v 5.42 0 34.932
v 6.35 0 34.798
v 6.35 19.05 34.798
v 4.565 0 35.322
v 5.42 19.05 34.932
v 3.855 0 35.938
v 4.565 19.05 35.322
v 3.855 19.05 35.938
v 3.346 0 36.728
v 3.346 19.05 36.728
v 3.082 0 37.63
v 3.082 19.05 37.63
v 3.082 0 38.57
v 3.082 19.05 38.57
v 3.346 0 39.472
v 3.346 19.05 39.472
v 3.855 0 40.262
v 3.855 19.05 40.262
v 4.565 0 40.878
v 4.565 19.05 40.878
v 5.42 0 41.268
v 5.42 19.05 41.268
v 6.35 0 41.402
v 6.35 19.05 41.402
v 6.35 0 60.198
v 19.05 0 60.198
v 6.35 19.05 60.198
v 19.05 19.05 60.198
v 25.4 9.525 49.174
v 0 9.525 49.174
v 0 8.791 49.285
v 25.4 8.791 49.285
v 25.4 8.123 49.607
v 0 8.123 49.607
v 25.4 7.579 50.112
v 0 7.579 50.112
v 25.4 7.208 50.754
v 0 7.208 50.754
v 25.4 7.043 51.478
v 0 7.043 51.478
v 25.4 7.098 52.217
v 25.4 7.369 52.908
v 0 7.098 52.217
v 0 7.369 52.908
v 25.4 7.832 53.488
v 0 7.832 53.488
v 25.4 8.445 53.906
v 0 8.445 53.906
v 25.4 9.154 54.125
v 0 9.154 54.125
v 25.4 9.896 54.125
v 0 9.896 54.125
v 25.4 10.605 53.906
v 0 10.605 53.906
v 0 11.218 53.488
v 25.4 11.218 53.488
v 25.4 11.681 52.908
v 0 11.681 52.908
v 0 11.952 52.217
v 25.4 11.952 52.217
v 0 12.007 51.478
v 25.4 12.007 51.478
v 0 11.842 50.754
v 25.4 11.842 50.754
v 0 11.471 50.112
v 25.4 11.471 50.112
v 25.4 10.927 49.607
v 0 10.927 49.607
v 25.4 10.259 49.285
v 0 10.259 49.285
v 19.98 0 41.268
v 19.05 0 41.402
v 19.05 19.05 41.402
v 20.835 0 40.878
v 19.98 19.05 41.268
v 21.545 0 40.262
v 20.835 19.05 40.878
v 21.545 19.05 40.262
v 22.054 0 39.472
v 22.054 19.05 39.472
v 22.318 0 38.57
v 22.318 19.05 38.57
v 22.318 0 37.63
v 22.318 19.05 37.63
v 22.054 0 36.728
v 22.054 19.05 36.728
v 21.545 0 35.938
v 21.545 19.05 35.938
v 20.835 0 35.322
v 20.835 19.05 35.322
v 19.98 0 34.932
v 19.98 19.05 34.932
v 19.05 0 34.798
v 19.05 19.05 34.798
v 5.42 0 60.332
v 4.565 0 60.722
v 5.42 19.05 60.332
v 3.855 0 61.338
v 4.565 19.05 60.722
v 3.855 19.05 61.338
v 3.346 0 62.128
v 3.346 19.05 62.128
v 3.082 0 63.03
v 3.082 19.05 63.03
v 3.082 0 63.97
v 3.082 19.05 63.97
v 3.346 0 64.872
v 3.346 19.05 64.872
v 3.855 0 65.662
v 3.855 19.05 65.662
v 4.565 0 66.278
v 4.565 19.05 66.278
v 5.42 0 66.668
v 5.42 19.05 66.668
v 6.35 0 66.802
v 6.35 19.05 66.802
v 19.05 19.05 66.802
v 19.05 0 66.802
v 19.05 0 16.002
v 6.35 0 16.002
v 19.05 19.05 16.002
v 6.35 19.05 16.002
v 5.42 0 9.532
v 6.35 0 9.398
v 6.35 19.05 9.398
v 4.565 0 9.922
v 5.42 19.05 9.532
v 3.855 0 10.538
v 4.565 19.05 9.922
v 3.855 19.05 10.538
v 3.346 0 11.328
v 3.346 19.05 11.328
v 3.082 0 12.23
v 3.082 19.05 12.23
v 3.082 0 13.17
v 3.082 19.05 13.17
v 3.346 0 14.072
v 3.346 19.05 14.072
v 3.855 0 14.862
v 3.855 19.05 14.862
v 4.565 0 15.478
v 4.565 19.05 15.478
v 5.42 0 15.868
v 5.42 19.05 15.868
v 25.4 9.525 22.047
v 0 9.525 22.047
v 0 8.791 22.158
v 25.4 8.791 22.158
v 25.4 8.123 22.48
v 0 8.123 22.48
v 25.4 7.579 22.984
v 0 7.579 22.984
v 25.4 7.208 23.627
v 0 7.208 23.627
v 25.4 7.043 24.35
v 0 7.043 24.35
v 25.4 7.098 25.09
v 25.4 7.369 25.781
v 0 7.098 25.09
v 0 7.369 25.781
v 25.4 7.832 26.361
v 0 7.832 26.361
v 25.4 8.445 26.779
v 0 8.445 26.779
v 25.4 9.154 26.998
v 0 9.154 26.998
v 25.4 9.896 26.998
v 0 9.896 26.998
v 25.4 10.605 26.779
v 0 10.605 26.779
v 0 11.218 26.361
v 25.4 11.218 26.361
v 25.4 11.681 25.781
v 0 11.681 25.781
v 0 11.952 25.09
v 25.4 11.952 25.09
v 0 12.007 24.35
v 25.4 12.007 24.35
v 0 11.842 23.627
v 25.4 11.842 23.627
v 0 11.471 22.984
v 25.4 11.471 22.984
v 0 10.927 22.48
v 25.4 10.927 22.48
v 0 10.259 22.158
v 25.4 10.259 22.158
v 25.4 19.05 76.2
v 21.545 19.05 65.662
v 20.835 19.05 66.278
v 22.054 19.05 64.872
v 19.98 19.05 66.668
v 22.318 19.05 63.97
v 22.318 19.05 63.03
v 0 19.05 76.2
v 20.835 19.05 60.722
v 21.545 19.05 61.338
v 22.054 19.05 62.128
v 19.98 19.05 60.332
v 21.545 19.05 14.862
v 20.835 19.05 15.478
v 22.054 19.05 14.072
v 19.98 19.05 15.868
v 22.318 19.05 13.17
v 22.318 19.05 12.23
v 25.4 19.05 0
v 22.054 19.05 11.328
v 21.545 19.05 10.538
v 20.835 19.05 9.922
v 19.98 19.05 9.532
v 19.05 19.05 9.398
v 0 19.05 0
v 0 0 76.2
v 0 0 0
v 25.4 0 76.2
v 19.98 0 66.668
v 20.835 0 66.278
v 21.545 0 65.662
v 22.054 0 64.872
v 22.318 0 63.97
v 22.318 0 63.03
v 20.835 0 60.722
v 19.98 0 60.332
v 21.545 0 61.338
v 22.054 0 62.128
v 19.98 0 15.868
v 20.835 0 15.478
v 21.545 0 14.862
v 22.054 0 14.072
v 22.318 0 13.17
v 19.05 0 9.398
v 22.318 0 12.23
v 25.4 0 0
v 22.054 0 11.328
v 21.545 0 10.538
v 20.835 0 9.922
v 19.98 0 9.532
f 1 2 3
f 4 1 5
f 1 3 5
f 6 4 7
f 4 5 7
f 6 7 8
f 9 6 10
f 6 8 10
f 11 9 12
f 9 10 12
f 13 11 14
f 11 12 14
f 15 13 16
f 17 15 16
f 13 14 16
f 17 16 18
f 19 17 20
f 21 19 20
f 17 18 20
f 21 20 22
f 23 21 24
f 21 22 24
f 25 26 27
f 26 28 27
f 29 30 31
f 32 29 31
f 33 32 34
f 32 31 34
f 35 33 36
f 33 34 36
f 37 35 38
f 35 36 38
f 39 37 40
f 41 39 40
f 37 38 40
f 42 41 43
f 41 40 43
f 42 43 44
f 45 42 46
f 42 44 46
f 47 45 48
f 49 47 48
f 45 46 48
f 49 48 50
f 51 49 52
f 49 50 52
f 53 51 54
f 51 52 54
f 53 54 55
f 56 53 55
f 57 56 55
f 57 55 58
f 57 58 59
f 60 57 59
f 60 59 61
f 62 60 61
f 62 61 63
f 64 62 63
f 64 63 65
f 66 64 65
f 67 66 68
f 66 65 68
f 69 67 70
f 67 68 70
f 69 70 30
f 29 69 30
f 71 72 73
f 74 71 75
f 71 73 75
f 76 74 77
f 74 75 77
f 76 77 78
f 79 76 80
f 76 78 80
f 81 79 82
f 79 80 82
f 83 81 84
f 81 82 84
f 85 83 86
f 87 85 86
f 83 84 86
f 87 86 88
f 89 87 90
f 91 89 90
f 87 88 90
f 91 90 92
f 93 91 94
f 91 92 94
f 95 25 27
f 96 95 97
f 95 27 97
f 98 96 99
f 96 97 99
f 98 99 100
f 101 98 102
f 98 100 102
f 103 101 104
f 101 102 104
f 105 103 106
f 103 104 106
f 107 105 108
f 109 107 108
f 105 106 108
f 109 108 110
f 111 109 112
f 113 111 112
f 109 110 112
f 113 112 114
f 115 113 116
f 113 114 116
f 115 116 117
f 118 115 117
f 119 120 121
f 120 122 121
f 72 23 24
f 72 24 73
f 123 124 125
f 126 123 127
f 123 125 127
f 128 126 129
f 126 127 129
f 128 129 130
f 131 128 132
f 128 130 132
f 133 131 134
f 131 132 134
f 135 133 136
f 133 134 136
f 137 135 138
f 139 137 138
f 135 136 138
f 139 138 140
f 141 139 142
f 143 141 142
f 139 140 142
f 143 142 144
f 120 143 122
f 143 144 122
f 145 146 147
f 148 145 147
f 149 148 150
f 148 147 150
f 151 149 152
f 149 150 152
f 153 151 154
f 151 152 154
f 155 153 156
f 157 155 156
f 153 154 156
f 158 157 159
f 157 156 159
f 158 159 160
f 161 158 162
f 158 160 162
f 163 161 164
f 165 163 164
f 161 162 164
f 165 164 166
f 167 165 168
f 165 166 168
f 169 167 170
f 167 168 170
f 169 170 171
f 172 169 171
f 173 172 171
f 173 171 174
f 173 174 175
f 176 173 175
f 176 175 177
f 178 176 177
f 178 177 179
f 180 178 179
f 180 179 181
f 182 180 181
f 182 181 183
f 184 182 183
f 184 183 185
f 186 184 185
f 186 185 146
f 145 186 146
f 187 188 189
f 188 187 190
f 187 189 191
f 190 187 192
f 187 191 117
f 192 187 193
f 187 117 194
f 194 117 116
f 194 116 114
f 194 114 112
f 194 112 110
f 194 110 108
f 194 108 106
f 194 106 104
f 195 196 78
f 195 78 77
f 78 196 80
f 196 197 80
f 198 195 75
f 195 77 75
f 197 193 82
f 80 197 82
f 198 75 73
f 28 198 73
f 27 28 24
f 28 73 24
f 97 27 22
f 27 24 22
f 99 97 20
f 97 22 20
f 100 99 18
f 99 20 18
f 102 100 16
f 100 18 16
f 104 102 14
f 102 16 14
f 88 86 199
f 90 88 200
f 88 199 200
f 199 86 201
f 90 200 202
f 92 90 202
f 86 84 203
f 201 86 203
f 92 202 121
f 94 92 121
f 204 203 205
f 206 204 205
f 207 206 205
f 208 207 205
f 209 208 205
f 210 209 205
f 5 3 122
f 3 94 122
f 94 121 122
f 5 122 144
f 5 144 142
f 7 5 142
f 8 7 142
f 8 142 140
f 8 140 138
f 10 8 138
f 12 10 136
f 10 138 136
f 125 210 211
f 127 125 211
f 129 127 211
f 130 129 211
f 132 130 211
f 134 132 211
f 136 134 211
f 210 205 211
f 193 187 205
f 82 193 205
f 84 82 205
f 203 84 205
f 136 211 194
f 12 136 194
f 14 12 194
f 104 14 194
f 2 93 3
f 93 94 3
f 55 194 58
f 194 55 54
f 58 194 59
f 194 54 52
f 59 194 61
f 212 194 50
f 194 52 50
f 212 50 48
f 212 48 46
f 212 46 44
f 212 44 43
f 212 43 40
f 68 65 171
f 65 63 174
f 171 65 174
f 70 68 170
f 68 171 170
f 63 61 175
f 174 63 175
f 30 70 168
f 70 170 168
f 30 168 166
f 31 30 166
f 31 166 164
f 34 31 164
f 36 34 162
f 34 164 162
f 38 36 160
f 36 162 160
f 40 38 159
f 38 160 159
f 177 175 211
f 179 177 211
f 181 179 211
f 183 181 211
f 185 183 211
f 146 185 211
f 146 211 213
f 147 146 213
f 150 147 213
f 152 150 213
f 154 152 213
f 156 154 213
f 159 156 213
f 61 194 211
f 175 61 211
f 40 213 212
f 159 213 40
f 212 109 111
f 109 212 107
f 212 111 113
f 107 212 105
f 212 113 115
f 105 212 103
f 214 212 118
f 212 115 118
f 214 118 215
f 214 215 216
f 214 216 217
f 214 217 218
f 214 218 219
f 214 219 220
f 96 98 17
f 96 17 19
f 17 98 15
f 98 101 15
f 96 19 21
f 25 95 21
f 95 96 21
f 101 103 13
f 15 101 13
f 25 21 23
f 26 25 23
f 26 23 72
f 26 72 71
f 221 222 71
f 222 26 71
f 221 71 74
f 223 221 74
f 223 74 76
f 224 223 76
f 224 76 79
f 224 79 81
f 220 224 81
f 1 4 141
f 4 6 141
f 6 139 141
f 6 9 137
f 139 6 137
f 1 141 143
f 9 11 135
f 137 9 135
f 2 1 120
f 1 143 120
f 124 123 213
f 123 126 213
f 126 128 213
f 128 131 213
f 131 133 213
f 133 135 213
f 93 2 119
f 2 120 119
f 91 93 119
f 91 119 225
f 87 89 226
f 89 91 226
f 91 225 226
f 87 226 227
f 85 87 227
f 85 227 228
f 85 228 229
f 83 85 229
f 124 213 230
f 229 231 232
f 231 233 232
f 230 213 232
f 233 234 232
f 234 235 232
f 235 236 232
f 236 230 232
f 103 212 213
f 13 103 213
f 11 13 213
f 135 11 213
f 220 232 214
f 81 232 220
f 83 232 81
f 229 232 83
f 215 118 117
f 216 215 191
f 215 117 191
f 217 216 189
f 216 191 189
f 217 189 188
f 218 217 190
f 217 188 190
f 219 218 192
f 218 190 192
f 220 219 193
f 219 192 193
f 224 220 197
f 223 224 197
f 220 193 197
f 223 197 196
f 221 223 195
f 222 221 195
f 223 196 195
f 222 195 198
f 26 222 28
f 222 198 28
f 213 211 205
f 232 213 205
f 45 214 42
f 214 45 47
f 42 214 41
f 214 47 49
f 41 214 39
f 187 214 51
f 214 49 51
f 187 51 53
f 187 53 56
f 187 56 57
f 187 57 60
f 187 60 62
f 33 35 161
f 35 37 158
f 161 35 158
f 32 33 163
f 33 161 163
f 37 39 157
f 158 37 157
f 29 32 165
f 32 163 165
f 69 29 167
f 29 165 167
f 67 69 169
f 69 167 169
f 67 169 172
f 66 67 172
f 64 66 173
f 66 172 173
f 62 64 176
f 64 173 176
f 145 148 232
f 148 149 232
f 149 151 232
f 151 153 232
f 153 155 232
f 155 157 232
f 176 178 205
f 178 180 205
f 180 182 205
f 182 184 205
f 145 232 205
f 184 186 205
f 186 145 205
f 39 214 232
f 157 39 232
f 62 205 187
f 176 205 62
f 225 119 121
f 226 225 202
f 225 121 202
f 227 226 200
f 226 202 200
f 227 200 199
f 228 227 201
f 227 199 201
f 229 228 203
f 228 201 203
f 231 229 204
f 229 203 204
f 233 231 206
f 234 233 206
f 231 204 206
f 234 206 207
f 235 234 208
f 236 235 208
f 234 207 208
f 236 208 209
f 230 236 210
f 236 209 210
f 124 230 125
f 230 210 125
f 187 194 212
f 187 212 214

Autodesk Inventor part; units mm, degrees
ref_plane "YZ Plane" through (0, 0, 0) normal (1, 0, 0) x (0, 1, 0)
ref_plane "XZ Plane" through (0, 0, 0) normal (0, 1, 0) x (-1, 0, 0)
ref_plane "XY Plane" through (0, 0, 0) normal (0, 0, 1) x (1, 0, 0)
sketch "Sketch1" plane through (0, 0, 0) normal (0, 0, 1) x (1, 0, 0)
  line L0 (0, 0) -> (25.4, 0)
  line L1 (25.4, 0) -> (25.4, 19.05)
  line L2 (25.4, 19.05) -> (0, 19.05)
  line L3 (0, 19.05) -> (0, 0)
  dimension "d0" = 25.4
  dimension "d1" = 19.05
extrude "Stock Bar" add sketch "Sketch1" along normal blind 76.2
sketch "Sketch2" plane through (25.4, 0, 0) normal (1, 0, 0) x (0, 0, -1)
  line L0 (0, 0) -> (0, 19.05) projected
  line L1 (0, 19.05) -> (-76.2, 19.05) projected
  point P0 (-51.6636, 9.525)
  point P1 (-24.5364, 9.525)
  dimension "d4" = 27.1272
  dimension "d6" = 9.525
  dimension "d7" = 9.525
  dimension "d29" = 24.5364
hole "Motor Support Mounting Holes" at (25.4, 9.525, 51.6636) at (25.4, 9.525, 24.5364) direction (-1, 0, 0) diameter 4.9784 end up to surface thread size "1/4-20 UNC" class "2B" standard "ANSI Unified Screw Threads"
sketch "Sketch3" plane through (0, 19.05, 0) normal (0, 1, 0) x (1, 0, 0)
  line L0 (6.35, -12.7) -> (19.05, -12.7) construction
  line L1 (6.35, -16.002) -> (19.05, -16.002)
  line L2 (19.05, -9.398) -> (6.35, -9.398)
  arc A0 (6.35, -9.398) -> (6.35, -16.002) centre (6.35, -12.7) ccw
  arc A1 (19.05, -16.002) -> (19.05, -9.398) centre (19.05, -12.7) ccw
  line L3 (6.35, -63.5) -> (19.05, -63.5) construction
  line L4 (6.35, -66.802) -> (19.05, -66.802)
  line L5 (19.05, -60.198) -> (6.35, -60.198)
  arc A2 (6.35, -60.198) -> (6.35, -66.802) centre (6.35, -63.5) ccw
  arc A3 (19.05, -66.802) -> (19.05, -60.198) centre (19.05, -63.5) ccw
  line L6 (6.35, -38.1) -> (19.05, -38.1) construction
  line L7 (6.35, -41.402) -> (19.05, -41.402)
  line L8 (19.05, -34.798) -> (6.35, -34.798)
  arc A4 (6.35, -34.798) -> (6.35, -41.402) centre (6.35, -38.1) ccw
  arc A5 (19.05, -41.402) -> (19.05, -34.798) centre (19.05, -38.1) ccw
  line L9 (25.4, 0) -> (25.4, -76.2) projected
  line L10 (25.4, -76.2) -> (0, -76.2) projected
  point P0 (12.7, -12.7)
  point P1 (12.7, -63.5)
  point P2 (12.7, -38.1)
  dimension "d15" = 3.302
  dimension "d16" = 3.302
  dimension "d17" = 3.302
  dimension "d18" = 12.7
  dimension "d19" = 12.7
  dimension "d20" = 12.7
  dimension "d21" = 25.4
  dimension "d22" = 25.4
  dimension "d23" = 6.35
  dimension "d24" = 6.35
  dimension "d25" = 6.35
  dimension "d26" = 12.7
extrude "Table Mounting Slots" cut sketch "Sketch3" against normal blind 101.6
properties part number "Motor Base" material "Aluminum 6061"
